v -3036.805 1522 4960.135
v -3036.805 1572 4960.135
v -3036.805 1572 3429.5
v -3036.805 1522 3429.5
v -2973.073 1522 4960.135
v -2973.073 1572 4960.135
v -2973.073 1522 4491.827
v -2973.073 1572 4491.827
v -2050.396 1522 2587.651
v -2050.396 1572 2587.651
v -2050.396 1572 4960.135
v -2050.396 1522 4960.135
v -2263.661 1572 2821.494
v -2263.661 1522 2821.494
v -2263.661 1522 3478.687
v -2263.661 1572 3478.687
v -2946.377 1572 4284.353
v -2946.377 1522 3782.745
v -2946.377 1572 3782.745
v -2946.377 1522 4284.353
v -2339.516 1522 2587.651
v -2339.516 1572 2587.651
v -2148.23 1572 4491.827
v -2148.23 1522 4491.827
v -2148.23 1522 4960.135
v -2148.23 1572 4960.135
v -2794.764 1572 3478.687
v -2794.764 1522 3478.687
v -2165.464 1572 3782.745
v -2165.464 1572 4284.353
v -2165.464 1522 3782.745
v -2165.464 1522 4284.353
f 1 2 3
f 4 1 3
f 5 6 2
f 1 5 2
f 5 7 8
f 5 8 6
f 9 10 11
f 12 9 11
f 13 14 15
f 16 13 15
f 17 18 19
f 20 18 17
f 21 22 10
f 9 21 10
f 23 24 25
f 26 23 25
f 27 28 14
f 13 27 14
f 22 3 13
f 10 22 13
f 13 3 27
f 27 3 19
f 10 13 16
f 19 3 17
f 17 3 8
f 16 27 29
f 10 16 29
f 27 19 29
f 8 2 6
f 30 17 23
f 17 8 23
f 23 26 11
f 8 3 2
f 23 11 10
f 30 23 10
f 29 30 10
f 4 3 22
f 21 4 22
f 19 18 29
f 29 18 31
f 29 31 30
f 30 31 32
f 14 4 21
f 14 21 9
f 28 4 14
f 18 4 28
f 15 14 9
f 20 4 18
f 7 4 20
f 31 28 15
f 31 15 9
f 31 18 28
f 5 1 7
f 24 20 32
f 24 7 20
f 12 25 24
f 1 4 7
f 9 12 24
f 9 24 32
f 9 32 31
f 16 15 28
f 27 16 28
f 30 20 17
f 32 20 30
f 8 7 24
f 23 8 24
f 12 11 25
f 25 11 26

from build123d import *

# Parameters (mm, degrees)
PAD018_DEPTH    = 50
POCKET003_DEPTH = 59
SKETCH022_W     = 780.912842
SKETCH022_H     = 501.60791
POCKET004_DEPTH = 60
SKETCH021_W     = 824.843506
SKETCH021_H     = 493.205078
POCKET005_DEPTH = 60


with BuildPart() as part:
    # Sketch023 → Pad018 (new body)
    with BuildSketch(Plane.XZ):
        Polygon((-3036.804688, 4960.135254), (-3036.804688, 3429.500488), (-2339.515625, 2587.651367), (-2050.395752, 2587.651367), (-2050.395752, 4960.135254), align=None)
    extrude(amount=PAD018_DEPTH)

    # Sketch024 (on Face7 of Pad018) → Pocket003 (cut)
    with BuildSketch(Plane.XZ.offset(50)):
        Polygon((-2794.763916, 3478.686768), (-2263.660645, 2821.494141), (-2263.660645, 3478.686768), align=None)
    extrude(amount=-POCKET003_DEPTH, mode=Mode.SUBTRACT)

    # Sketch022 (on Face5 of Pocket003) → Pocket004 (cut)
    with BuildSketch(Plane.XZ.offset(50)):
        with Locations((-2555.920776, 4033.548584)):
            Rectangle(SKETCH022_W, SKETCH022_H)
    extrude(amount=-POCKET004_DEPTH, mode=Mode.SUBTRACT)

    # Sketch021 (on Face5 of Pocket004) → Pocket005 (cut)
    with BuildSketch(Plane.XZ.offset(50)):
        with Locations((-2560.651733, 4738.429199)):
            Rectangle(SKETCH021_W, SKETCH021_H)
    extrude(amount=-POCKET005_DEPTH, mode=Mode.SUBTRACT)


with BuildPart() as part_1:
    # Body016 placement: moved
    add(part.part.moved(Location((0, 1572, 0))))


solid = part_1.part
